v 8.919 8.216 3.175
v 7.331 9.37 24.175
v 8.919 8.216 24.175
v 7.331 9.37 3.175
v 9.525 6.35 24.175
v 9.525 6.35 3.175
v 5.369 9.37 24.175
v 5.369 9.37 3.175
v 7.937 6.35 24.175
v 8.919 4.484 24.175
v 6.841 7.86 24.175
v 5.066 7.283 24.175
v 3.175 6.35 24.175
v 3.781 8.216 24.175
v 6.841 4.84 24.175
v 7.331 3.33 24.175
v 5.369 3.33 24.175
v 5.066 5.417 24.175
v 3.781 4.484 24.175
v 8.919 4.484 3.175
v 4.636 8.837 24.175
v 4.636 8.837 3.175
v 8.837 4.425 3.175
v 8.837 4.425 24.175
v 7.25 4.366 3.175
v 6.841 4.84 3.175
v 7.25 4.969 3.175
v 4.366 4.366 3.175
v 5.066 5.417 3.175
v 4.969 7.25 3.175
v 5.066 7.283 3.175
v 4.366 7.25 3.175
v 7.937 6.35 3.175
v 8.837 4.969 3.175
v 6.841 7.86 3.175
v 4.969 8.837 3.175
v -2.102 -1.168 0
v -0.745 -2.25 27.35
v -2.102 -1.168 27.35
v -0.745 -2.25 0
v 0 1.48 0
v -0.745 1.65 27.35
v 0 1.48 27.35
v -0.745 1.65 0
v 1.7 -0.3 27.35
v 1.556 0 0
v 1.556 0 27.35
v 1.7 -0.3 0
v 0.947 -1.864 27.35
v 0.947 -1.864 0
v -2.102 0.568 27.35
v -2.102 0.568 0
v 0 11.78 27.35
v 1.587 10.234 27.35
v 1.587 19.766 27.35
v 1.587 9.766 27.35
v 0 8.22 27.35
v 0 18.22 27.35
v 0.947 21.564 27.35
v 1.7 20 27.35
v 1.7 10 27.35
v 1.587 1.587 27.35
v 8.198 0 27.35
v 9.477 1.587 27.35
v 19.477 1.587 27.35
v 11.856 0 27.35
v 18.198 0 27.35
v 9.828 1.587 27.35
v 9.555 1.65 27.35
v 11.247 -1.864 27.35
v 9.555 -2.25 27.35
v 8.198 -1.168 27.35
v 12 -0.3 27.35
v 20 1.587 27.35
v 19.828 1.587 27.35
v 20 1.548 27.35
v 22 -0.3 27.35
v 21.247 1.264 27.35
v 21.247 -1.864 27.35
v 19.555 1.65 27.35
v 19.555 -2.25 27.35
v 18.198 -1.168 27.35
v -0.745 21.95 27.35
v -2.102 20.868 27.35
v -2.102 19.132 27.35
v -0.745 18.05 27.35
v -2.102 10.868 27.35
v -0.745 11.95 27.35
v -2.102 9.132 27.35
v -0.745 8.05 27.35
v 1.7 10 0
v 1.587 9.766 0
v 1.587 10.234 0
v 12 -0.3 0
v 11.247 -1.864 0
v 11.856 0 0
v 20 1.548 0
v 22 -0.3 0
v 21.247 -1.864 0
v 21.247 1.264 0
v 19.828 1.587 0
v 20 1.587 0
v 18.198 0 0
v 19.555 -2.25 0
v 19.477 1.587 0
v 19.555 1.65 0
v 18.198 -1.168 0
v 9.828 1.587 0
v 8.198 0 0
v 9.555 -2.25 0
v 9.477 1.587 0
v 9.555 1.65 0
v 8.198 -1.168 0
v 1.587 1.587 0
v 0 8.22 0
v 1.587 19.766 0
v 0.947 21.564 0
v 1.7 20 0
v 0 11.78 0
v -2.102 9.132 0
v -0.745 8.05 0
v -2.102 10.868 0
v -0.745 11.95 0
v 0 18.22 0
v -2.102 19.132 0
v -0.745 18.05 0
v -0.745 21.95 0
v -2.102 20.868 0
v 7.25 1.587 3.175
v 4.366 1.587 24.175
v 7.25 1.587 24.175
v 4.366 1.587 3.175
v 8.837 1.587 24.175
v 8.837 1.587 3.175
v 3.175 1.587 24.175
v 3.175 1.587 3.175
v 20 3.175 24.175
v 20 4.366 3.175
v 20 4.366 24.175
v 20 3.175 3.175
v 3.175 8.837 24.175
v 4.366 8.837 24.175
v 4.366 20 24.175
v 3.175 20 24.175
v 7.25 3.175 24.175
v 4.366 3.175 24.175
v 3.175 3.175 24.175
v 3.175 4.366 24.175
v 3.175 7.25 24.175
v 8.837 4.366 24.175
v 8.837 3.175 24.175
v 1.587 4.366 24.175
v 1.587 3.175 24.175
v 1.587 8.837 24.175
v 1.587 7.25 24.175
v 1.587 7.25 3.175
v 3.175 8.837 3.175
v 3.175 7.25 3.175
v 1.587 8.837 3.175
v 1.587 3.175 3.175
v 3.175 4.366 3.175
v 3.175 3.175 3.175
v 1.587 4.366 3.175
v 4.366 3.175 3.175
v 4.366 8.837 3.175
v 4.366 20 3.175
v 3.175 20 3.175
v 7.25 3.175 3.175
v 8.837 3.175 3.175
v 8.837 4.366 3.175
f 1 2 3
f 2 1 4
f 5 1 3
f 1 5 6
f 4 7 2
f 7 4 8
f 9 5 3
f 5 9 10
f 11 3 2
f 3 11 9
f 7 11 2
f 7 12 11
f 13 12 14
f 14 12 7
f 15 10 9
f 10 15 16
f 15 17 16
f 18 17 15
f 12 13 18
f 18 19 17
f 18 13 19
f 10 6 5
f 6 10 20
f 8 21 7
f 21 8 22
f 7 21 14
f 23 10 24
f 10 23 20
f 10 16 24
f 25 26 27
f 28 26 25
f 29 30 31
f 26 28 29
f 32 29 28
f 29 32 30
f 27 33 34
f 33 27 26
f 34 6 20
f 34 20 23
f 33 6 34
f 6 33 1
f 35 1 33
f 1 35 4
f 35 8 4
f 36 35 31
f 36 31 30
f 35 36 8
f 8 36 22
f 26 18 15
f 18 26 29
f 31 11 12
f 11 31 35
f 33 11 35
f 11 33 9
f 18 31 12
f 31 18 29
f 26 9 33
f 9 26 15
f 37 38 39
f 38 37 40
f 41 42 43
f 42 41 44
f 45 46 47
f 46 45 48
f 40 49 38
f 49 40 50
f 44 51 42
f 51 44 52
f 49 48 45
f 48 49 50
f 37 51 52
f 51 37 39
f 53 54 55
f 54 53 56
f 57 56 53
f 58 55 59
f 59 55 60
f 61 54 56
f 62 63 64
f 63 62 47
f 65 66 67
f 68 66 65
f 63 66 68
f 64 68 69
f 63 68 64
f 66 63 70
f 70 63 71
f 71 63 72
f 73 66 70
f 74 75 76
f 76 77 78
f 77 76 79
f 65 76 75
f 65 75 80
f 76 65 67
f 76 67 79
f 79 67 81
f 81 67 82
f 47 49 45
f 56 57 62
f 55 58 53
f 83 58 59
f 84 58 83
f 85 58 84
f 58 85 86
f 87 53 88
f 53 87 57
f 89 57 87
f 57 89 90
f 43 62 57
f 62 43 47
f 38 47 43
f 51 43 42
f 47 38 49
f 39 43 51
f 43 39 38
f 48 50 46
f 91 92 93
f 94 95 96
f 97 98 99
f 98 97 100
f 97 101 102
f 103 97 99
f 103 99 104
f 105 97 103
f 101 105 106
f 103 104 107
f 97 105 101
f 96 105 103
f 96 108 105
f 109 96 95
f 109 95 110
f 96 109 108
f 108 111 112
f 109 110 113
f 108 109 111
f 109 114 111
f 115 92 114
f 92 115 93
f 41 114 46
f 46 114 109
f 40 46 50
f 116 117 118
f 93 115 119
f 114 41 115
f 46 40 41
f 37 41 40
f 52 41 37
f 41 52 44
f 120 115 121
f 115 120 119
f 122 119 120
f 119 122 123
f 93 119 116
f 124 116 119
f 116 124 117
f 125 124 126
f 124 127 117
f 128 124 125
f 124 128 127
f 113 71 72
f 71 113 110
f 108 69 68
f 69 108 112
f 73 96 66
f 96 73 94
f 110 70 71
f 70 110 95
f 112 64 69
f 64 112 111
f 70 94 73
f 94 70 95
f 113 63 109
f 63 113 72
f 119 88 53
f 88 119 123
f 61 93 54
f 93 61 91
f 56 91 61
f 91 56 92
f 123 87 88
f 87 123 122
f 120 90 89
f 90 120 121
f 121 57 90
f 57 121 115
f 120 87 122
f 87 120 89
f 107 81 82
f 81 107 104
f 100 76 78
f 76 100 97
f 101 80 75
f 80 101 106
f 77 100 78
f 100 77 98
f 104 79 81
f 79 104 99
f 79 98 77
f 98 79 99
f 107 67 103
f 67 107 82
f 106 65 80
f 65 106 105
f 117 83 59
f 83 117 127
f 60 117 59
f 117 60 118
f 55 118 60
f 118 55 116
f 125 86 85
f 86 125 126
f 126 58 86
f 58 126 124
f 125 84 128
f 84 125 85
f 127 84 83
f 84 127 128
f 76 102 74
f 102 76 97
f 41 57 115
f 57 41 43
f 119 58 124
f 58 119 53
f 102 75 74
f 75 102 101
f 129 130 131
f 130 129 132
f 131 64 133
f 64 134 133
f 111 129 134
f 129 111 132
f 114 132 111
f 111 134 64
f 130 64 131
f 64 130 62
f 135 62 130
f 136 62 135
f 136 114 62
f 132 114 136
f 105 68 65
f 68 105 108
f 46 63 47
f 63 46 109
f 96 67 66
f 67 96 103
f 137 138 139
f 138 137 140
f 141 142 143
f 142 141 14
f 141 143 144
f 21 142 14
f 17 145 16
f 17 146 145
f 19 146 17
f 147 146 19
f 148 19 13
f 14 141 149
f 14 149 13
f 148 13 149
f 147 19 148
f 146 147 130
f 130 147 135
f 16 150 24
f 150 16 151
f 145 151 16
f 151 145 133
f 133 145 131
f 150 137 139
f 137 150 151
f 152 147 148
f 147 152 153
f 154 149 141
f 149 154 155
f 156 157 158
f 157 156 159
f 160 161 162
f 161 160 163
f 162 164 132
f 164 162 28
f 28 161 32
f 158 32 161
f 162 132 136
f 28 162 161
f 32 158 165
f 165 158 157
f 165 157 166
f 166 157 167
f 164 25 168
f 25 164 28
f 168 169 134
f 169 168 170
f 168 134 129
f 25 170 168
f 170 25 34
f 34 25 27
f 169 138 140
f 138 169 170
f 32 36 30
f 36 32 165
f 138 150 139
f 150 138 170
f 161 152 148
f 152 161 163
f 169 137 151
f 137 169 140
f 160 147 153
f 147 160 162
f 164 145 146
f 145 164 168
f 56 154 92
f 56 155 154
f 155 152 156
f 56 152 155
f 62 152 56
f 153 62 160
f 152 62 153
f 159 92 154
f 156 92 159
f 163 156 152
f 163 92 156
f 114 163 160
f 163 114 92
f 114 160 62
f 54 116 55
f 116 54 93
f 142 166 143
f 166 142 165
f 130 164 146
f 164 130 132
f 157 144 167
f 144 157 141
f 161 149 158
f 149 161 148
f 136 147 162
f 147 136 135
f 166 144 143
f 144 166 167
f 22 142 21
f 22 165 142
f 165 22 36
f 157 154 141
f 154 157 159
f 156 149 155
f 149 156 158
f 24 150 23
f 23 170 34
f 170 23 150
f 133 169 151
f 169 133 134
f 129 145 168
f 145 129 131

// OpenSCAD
/**
 * joints2.scad is part of Paper Laptop project.
 * This file contains various models for joining two or
 * more pieces of flat materials together.
 *
 * @author R. S. Doiel, <rsdoiel@gmail.com>
 * copyright (c) 2016 all rights reserved
 * Released under a BSD 2-clause license
 */

/*
# misc notes

|  Inches   | Inches    |  Millimeters |
|(fraction) | (decimal) |              | 
+-----------+-----------+--------------+
|    1/16   |    0.0625 | 1.5875       |
|    1/8    |    0.125  | 3.175        |
|    3/16   |    0.1875 | 4.7625       |
|    1/4    |    0.25   | 6.35         |
|    3/8    |    0.375  | 9.525        |
|    1/2    |    0.5    | 12.7         |
|    5/8    |    0.625  | 15.875       |
|    3/4    |    0.75   | 19.05        |
|    7/8    |    0.875  | 22.225       |
|    1      |    1.0    | 25.4         |

## Raspberry Pi Dimensions

85.60mm x 56mm x 21mm 
(or roughly 3.37″ x 2.21″ x 0.83″)

 */
 
 /*
  * Corner: case corners, units assumed is 1mm
  */
module Corner() {
    // sizing and spacing
    t = 3.175;// Aprox. 1/8 inch.
    side_t = t/2;
    side_l = 20;
    b_spacing = side_l/2;
    inner_h = 21;
    inner_t = t*1.25;
    outer_t = side_t;
    outer_h = inner_h+(2*t);
    bump_r = 2;
    bump_o = -0.3;
 
    // main fastening surface
    translate([t*2, t*2, t]) {
        difference() {
            // fastener body
            color([1,0,0]) cylinder(h=inner_h, r=t, center=false);
            // bolt hole
            color([0,0,0]) cylinder(h=inner_h, r=t/2, center=false);
        }
    }

    // corner bumper
    translate([bump_o, bump_o, 0]) {
        color([1,0,0]) cylinder(h=outer_h, r=bump_r, center=false);
    }

    // middle bumpers side a
    translate([b_spacing, bump_o, 0]) {
        color([1,0,0]) cylinder(h=outer_h, r=bump_r, center=false);
    }
    
    // middle bumpers side b
    translate([bump_o, b_spacing, 0]) {
        color([1,0,0]) cylinder(h=outer_h, r=bump_r, center=false);
    }

    // end bumpers
    translate([side_l, bump_o, 0]) {
        color([1,0,0]) cylinder(h=outer_h, r=bump_r, center=false);
    }
    translate([bump_o, side_l, 0]) {
        color([1,0,0]) cylinder(h=outer_h, r=bump_r, center=false);
    }
    
    // outer side a
    translate([0, 0, 0]) {
       color([0,1,0]) cube([side_l, side_t, outer_h], center=false);
    }
    
    // Inner side a
    translate([0, t, t]) {
       color([0,1,0]) cube([side_l, side_t*0.75, inner_h], center=false);
    }
    
    // outer side b
    translate([0, 0, 0]) {
       color([0,1,0]) cube([side_t, side_l, outer_h], center=false);
    }
    
    // Inner side b
    translate([t, 0, t]) {
       color([0,1,0]) cube([side_t*0.75, side_l, inner_h], center=false);
    }
    
    // filler corner
    translate([1, 7.25, t]) {
       color([0,0, 1]) cube([inner_t, outer_t, inner_h], center=false);
    }
    translate([7.25, 1, t]) {
       color([0,0, 1]) cube([outer_t, inner_t, inner_h], center=false);
    }
}

Corner();
